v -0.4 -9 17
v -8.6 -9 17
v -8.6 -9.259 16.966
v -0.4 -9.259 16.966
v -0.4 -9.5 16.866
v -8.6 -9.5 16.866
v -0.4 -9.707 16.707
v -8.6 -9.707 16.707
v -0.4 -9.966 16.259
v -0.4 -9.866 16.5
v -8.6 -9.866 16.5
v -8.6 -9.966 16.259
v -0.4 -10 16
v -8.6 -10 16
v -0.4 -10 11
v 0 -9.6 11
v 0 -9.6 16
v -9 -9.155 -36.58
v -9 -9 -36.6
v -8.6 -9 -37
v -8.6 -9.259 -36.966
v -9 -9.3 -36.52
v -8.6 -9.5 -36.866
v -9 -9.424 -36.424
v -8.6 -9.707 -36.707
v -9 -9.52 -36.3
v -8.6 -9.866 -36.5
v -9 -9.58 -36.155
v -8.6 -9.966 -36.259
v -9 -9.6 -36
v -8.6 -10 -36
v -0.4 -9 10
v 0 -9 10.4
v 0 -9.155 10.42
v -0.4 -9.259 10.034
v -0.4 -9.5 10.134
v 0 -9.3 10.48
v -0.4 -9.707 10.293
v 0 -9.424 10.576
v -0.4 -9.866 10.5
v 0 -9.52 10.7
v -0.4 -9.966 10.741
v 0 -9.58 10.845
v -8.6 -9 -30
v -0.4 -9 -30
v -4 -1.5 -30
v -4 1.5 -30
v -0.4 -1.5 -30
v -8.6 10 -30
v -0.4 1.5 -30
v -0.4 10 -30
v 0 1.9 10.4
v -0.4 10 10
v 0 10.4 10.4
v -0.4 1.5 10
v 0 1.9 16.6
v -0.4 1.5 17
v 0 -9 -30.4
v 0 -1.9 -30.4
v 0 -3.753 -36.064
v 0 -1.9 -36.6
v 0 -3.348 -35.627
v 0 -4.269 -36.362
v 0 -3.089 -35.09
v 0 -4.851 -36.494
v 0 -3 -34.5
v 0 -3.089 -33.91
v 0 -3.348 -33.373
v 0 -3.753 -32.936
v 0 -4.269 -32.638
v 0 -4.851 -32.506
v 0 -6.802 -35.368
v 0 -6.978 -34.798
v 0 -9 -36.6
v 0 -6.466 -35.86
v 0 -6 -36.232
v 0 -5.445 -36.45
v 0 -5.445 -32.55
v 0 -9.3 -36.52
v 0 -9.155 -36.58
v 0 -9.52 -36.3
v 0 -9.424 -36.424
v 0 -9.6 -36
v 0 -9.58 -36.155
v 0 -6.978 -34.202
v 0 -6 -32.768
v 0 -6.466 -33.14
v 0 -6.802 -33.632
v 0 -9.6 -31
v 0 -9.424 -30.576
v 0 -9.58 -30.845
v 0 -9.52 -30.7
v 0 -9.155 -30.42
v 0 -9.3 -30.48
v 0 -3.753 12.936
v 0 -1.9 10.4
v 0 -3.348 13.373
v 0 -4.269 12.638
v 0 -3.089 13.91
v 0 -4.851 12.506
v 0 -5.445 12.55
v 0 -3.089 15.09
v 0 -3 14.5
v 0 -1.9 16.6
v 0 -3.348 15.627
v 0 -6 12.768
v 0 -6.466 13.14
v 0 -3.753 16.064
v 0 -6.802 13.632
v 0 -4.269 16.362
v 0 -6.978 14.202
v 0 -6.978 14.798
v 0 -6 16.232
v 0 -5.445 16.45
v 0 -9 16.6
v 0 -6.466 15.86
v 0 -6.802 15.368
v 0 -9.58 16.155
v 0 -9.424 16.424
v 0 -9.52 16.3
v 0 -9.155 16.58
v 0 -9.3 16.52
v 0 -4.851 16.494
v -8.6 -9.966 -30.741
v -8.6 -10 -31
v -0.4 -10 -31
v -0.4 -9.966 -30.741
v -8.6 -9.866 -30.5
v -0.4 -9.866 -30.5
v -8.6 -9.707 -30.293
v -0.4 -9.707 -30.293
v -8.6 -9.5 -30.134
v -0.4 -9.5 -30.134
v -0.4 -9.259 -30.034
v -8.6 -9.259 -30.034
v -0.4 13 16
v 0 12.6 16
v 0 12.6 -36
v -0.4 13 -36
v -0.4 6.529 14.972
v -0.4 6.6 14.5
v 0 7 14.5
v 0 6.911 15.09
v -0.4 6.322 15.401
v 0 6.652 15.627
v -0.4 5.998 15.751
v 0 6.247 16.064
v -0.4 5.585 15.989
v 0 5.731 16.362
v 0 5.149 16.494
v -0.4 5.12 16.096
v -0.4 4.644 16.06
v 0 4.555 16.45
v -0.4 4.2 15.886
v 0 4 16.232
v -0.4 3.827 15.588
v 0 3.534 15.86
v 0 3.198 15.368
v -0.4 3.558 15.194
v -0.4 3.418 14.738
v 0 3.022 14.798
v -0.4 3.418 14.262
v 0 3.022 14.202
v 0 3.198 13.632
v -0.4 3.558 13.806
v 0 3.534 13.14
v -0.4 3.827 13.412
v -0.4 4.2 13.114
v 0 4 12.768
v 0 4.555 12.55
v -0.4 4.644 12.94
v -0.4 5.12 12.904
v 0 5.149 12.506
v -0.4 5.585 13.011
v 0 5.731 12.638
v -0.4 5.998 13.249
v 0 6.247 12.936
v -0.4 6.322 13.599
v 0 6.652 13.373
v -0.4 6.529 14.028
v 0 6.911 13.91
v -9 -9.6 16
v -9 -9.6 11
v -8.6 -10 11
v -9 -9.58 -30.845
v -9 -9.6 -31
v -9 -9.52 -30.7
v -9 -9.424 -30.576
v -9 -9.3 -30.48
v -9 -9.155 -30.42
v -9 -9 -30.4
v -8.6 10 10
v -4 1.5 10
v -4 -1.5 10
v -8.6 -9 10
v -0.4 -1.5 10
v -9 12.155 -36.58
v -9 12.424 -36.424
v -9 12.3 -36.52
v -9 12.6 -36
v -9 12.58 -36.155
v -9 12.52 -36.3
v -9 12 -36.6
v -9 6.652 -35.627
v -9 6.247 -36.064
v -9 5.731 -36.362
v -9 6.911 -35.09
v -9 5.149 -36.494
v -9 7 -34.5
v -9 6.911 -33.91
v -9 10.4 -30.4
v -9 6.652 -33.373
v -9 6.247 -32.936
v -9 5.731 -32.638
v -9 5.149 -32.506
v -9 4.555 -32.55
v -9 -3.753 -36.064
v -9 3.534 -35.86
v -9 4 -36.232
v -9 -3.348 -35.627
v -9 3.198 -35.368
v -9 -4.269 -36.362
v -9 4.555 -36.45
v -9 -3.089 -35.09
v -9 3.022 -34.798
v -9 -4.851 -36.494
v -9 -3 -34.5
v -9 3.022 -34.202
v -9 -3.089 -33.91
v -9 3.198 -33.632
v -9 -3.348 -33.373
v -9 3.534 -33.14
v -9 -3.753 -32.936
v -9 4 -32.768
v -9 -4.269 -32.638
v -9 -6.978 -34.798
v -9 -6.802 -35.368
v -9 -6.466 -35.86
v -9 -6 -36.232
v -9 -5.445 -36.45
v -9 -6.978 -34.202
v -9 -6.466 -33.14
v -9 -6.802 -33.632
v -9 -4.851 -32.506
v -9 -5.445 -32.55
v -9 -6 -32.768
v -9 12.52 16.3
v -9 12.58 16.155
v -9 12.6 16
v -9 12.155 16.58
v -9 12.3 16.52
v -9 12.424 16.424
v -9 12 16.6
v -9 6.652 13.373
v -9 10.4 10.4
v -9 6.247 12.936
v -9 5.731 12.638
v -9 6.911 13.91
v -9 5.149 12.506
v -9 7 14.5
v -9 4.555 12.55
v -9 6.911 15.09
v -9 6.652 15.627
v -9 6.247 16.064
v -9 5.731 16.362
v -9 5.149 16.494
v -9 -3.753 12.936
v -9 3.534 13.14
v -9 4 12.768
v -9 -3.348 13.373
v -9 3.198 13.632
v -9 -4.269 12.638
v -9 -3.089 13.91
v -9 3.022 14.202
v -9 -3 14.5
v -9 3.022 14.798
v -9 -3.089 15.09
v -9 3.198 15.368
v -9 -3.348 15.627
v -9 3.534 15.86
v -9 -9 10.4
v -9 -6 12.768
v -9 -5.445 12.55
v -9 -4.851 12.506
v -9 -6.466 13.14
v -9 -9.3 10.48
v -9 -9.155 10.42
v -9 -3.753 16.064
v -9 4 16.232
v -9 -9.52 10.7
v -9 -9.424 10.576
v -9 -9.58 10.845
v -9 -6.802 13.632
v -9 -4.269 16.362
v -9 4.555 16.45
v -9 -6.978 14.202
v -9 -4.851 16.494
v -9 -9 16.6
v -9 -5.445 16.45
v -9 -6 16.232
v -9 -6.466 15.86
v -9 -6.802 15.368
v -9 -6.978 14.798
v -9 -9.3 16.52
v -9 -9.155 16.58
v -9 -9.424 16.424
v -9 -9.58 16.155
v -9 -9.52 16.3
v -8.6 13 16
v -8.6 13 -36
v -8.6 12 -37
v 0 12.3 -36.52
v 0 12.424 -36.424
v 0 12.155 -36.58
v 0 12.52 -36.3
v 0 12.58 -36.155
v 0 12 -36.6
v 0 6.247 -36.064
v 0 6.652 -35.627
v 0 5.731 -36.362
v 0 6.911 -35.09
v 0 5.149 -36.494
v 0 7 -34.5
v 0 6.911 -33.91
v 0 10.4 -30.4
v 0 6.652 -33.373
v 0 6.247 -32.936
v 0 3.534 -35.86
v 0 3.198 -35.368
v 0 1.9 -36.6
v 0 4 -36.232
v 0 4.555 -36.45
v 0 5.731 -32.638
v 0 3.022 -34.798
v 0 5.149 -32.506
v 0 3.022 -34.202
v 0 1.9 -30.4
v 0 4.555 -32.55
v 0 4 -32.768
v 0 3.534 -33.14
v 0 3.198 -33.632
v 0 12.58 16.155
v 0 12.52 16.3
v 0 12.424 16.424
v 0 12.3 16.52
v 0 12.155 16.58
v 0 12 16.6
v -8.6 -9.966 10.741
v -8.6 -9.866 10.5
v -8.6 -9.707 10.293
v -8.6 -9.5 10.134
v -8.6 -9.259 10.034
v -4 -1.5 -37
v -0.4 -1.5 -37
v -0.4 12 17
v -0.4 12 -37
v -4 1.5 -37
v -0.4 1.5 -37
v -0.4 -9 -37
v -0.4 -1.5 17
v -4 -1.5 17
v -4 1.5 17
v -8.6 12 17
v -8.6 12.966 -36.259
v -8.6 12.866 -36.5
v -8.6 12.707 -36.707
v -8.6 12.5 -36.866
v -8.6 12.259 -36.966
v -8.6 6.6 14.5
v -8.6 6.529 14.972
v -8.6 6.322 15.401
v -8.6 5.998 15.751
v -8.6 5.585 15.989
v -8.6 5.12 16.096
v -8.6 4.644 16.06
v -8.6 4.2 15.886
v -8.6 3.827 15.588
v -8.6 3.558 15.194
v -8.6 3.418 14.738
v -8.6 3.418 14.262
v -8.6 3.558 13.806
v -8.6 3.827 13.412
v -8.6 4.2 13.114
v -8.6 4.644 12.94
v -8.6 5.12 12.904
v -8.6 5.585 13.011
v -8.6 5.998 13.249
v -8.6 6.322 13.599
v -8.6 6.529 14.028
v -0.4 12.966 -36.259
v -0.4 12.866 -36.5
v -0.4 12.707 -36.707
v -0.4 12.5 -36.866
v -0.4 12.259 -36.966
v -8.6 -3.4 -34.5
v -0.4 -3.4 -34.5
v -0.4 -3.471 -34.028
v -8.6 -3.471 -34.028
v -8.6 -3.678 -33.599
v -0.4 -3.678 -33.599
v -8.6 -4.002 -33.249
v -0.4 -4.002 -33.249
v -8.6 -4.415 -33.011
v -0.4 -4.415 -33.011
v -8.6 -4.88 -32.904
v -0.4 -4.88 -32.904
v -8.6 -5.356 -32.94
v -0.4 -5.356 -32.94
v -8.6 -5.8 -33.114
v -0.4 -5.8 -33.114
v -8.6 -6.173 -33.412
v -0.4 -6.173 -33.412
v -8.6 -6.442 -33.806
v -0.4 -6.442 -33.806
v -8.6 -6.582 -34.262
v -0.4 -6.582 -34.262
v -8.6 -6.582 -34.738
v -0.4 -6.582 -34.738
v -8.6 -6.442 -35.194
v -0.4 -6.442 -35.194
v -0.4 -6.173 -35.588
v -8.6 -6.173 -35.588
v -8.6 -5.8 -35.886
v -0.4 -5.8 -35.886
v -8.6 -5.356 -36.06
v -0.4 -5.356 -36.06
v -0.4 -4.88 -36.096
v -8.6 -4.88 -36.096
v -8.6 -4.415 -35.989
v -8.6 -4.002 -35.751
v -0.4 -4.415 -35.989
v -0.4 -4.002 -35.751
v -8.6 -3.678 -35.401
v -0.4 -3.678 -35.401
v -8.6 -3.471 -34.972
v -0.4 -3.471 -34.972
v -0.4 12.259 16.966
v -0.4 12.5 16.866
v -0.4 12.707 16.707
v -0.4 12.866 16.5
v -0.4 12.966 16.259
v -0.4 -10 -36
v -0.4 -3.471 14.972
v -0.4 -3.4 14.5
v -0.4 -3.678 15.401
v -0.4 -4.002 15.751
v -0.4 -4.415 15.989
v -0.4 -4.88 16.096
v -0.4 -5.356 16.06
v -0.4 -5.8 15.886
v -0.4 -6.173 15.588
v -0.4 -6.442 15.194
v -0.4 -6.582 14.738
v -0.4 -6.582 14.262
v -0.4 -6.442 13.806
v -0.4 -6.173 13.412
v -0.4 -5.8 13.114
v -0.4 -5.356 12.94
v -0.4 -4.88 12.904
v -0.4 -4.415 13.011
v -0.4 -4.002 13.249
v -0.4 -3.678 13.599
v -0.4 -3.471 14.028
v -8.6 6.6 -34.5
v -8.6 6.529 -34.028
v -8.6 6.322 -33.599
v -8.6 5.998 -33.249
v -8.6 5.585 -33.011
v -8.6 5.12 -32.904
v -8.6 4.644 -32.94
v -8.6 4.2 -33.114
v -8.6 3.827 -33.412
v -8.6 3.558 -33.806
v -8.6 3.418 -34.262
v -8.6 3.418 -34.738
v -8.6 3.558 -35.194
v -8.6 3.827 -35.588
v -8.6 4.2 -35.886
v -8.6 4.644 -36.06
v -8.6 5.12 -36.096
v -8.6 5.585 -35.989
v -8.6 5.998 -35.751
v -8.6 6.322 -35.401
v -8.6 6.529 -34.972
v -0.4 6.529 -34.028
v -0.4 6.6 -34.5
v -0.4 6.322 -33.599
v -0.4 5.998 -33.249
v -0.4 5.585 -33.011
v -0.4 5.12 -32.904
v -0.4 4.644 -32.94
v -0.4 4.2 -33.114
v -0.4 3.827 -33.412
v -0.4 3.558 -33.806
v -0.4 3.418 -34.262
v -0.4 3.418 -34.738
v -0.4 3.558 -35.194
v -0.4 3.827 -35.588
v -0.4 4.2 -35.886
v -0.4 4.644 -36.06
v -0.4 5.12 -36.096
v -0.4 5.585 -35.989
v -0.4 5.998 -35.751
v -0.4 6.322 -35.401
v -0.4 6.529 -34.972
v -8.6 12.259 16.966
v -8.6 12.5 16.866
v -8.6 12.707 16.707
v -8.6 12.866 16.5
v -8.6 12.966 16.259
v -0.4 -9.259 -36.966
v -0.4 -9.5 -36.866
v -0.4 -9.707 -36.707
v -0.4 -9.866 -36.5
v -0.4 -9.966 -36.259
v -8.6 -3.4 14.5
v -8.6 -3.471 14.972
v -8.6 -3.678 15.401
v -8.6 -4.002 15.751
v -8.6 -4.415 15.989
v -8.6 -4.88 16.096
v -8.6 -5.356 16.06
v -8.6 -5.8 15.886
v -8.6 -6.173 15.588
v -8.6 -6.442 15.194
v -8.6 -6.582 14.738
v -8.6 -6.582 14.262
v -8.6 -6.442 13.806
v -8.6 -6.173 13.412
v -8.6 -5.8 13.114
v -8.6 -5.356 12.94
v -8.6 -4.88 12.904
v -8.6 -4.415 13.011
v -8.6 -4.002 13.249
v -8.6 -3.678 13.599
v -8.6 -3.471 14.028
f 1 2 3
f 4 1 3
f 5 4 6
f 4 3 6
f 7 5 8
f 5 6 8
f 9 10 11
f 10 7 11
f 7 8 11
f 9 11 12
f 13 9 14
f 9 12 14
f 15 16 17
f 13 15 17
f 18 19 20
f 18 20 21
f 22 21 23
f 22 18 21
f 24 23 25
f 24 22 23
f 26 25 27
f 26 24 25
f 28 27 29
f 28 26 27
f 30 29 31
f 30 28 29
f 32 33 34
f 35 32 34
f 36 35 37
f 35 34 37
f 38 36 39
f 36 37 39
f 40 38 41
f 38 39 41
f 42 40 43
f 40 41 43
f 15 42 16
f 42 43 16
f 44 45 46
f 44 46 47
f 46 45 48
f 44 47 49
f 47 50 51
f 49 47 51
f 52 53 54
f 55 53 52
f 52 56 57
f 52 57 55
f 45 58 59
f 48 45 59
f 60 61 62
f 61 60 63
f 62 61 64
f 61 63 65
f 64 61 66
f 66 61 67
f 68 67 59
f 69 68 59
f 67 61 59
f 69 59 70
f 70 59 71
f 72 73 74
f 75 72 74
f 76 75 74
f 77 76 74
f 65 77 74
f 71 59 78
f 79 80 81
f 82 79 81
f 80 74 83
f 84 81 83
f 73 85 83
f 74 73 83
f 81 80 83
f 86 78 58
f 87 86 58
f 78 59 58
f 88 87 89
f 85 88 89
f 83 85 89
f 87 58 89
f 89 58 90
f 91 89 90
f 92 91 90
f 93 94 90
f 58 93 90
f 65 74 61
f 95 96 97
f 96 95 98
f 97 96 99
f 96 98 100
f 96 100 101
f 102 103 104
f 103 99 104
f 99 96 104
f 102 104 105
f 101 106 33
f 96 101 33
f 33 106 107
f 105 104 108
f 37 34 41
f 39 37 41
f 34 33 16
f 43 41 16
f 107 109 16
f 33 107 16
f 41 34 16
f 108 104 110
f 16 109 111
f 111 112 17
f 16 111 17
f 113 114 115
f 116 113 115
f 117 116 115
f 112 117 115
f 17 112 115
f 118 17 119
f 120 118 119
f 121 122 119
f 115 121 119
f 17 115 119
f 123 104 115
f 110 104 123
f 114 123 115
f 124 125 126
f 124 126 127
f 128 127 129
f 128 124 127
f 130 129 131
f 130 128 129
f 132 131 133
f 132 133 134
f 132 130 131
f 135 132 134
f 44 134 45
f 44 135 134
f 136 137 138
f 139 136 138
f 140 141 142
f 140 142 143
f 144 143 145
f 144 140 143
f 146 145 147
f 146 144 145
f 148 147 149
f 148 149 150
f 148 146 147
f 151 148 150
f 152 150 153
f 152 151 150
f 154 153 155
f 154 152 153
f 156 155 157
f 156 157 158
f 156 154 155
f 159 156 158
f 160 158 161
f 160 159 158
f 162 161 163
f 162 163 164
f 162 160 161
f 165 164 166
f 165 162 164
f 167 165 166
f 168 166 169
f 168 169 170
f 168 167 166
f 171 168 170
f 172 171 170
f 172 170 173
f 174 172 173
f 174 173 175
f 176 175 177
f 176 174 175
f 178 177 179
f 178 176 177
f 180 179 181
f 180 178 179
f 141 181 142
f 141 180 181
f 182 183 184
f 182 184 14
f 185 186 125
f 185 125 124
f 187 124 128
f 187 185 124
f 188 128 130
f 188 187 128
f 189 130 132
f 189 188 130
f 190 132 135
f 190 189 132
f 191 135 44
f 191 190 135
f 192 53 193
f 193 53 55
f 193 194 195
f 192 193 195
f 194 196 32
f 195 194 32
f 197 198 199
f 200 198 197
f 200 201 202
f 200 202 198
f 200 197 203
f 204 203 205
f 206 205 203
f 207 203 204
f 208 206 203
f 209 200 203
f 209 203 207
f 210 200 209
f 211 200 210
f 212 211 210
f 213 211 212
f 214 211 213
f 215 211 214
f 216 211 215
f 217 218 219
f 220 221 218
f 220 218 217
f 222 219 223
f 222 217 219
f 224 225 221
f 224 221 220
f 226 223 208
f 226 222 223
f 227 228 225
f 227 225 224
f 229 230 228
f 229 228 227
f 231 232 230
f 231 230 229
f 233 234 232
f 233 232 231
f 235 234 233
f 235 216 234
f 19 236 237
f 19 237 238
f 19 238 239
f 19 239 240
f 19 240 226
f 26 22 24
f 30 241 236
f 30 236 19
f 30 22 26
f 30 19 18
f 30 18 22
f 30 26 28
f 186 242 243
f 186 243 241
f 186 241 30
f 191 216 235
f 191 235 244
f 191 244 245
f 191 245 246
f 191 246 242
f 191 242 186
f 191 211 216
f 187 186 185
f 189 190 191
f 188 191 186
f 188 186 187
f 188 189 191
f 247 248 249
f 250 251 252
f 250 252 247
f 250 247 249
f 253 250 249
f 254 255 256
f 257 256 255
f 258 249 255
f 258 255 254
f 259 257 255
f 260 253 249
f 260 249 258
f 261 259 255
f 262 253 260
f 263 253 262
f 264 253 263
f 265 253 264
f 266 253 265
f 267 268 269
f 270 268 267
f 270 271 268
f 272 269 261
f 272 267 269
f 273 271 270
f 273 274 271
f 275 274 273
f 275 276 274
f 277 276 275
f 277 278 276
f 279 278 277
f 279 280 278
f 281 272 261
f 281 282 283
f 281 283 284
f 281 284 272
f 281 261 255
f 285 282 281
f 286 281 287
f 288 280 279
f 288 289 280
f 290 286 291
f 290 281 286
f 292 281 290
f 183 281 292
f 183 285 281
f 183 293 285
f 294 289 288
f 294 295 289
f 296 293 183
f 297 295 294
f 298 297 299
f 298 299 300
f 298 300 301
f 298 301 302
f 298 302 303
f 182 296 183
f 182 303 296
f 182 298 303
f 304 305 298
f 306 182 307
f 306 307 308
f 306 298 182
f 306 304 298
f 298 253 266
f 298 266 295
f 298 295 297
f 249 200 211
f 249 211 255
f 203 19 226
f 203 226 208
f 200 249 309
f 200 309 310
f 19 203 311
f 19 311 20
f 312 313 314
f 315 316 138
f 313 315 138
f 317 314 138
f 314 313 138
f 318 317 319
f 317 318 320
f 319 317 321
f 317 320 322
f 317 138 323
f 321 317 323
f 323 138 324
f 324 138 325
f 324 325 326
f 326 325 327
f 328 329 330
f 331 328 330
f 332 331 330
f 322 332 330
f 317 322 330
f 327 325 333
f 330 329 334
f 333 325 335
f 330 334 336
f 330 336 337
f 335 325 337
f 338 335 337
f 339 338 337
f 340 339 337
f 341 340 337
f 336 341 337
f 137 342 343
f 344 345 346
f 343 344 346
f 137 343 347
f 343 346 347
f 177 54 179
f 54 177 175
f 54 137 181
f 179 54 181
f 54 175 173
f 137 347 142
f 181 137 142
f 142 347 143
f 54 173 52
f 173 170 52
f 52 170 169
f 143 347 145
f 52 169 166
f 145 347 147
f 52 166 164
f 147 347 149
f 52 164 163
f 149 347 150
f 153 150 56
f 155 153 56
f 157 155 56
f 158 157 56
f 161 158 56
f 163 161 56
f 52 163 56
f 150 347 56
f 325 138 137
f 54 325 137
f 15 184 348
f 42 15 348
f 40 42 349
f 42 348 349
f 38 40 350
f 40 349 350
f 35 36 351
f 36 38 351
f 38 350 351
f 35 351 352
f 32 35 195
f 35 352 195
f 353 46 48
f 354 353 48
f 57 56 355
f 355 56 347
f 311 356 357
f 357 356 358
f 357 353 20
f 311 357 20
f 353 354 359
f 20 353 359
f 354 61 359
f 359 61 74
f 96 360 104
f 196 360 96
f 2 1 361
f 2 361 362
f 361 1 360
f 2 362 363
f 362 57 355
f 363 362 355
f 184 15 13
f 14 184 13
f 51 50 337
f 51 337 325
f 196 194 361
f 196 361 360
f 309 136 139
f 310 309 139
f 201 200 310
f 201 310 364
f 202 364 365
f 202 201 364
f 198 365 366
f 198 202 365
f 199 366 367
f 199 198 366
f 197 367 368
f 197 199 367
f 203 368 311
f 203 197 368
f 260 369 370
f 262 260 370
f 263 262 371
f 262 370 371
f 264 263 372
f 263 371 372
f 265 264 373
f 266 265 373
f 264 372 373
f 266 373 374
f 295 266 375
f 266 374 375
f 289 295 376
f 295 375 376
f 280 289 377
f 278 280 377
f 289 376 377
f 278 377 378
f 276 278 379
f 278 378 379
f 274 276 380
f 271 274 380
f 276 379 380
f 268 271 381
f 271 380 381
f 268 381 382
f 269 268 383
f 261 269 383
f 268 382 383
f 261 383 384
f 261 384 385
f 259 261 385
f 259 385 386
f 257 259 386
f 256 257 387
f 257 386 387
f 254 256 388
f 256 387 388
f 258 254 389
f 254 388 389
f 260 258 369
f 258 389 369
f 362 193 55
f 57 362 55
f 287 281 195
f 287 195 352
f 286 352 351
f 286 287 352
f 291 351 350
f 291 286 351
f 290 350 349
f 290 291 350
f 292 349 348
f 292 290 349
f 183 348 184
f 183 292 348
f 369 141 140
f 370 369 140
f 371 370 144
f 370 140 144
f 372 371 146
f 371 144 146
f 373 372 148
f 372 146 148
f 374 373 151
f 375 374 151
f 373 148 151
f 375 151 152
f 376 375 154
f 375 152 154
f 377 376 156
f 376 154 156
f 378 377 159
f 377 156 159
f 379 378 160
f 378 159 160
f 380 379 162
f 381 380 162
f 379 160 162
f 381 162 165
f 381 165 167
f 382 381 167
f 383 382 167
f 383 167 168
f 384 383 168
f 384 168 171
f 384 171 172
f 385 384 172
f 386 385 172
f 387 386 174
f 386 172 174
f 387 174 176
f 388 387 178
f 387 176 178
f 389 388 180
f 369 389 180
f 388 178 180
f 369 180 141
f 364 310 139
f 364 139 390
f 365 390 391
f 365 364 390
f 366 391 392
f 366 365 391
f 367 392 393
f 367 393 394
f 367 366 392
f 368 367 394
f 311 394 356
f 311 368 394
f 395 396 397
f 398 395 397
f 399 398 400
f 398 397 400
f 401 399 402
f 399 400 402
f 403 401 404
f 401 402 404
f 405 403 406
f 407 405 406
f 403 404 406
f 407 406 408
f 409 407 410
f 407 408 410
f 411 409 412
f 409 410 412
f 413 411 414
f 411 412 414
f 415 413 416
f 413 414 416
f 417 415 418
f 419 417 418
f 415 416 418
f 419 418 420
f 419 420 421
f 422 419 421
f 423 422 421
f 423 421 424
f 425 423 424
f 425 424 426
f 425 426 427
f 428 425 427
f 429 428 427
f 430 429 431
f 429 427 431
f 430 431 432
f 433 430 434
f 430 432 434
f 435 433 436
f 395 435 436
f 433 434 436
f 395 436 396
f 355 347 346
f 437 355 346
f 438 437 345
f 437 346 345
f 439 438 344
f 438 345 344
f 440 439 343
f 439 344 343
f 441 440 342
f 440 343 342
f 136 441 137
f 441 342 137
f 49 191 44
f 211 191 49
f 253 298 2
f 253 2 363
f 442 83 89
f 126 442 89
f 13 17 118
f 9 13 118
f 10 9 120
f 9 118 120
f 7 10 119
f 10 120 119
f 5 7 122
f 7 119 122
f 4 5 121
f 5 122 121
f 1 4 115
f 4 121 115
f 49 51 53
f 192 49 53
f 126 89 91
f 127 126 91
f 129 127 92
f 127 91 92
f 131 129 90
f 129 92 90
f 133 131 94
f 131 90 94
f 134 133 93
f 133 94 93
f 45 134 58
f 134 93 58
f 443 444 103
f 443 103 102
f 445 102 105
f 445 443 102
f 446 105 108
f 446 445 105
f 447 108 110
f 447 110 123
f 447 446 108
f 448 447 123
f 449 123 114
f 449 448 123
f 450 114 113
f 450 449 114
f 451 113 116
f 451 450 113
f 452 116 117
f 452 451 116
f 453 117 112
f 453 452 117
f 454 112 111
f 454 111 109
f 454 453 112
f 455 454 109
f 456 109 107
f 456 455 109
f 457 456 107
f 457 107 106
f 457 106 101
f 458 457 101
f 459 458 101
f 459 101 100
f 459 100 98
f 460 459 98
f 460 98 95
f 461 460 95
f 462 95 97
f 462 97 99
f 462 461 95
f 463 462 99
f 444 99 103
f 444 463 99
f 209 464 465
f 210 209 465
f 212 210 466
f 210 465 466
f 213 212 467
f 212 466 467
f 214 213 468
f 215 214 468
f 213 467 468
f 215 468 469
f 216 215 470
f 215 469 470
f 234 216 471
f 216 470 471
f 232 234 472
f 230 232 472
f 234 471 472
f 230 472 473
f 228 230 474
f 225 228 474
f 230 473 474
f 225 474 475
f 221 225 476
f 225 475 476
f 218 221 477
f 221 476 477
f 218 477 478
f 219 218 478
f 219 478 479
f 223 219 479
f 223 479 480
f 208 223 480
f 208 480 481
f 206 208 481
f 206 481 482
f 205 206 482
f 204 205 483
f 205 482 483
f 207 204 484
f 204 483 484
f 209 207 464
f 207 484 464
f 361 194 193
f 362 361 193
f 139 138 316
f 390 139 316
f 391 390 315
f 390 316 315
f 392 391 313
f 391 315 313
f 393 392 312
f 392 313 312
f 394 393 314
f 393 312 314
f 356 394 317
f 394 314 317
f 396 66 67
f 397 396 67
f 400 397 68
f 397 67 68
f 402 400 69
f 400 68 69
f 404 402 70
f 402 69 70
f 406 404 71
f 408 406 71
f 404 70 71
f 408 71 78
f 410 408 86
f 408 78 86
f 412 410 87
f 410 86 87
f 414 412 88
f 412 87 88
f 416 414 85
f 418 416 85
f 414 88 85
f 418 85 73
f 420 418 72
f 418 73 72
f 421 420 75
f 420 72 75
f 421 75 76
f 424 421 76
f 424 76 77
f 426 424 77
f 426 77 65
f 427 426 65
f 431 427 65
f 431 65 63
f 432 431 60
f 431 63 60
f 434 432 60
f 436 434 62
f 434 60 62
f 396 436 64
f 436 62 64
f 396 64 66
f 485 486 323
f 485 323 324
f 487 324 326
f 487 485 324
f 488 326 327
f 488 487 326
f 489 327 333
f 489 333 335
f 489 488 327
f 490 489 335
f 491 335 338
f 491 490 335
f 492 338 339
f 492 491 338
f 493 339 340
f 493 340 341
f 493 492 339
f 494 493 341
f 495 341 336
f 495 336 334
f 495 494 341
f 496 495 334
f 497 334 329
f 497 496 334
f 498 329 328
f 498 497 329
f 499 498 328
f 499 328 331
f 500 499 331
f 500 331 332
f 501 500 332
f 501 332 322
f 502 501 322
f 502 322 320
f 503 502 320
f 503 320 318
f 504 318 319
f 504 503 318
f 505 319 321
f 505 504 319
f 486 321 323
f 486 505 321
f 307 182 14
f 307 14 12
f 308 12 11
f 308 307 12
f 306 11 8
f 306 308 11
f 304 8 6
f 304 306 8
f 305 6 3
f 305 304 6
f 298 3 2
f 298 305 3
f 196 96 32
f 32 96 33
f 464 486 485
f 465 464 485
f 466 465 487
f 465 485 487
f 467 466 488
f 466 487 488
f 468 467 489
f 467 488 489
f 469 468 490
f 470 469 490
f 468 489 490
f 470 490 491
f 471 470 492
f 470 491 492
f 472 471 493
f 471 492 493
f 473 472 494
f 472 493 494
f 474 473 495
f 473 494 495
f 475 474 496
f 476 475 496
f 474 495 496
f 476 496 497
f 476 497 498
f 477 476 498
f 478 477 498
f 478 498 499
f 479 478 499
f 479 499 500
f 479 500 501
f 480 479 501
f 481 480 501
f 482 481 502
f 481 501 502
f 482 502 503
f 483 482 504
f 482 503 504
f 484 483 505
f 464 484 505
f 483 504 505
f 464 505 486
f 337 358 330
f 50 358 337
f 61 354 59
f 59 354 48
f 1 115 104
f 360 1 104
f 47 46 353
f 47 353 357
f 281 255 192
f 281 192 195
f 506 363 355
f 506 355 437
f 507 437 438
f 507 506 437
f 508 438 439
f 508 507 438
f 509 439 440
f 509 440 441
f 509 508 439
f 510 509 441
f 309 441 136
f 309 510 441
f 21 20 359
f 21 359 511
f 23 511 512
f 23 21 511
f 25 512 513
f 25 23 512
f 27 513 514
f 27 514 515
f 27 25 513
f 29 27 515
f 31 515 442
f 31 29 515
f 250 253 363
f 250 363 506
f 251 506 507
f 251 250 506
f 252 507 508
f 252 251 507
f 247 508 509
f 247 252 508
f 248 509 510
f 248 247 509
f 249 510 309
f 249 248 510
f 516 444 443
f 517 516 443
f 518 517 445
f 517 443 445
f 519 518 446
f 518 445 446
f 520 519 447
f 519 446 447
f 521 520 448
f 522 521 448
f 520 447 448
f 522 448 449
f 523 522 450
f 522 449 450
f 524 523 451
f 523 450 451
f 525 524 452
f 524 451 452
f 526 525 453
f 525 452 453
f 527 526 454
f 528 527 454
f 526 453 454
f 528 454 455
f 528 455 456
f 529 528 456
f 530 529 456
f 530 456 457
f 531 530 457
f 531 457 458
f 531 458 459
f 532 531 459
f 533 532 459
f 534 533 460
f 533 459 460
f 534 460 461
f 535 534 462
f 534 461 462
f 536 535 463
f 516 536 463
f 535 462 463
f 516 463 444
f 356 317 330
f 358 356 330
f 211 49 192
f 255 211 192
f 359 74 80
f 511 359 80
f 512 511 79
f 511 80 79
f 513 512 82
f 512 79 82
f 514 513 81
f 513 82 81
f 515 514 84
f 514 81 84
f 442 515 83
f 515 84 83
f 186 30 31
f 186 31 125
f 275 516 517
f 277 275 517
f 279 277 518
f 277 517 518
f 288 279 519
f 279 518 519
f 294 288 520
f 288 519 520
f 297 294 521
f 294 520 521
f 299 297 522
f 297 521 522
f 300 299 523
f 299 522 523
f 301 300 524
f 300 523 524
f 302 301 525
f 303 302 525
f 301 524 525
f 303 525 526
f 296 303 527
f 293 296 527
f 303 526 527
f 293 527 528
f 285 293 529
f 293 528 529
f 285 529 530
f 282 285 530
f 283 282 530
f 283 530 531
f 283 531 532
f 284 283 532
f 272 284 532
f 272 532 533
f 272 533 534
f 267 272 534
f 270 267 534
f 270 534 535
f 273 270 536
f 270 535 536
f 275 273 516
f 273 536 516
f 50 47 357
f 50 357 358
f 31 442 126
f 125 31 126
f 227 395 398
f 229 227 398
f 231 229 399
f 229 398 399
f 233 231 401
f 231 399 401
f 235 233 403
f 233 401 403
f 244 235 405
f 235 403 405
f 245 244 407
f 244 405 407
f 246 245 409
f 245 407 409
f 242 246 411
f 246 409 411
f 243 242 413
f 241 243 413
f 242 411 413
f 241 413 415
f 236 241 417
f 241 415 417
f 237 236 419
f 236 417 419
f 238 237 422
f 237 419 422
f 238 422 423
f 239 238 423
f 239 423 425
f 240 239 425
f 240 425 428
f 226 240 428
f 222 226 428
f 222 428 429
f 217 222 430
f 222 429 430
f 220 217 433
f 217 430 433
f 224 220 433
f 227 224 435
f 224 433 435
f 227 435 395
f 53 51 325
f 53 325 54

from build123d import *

# Parameters (mm, degrees)
SKETCH044_R       = 1.6
PAD025_DEPTH      = 9
FILLET013_R       = 1
SKETCH075_W       = 8
SKETCH075_H       = 3
POCKET_DEPTH      = 37.001
POCKET_DEPTH_BACK = -17.001
CHAMFER_SIZE      = 0.4


with BuildPart() as part:
    # Sketch044 → Pad025 (new body)
    with BuildSketch(Plane.YZ):
        Polygon((-10, 17), (13, 17), (13, -37), (-10, -37), (-10, -30), (10, -30), (10, 10), (-10, 10), align=None)
        with Locations((-5, 14.5)):
            Circle(SKETCH044_R, mode=Mode.SUBTRACT)
        with Locations((5, 14.5)):
            Circle(SKETCH044_R, mode=Mode.SUBTRACT)
        with Locations((-5, -34.5)):
            Circle(SKETCH044_R, mode=Mode.SUBTRACT)
        with Locations((5, -34.5)):
            Circle(SKETCH044_R, mode=Mode.SUBTRACT)
    extrude(amount=-PAD025_DEPTH)

    # Fillet013
    fillet013_edges = [part.edges().sort_by_distance(p)[0] for p in [
        (-4.5, -10, 17),
        (-4.5, -10, 10),
        (-4.5, -10, -30),
        (-4.5, -10, -37),
        (-4.5, 13, -37),
        (-4.5, 13, 17),
    ]]
    fillet(fillet013_edges, radius=FILLET013_R)

    # Sketch075 (on XY_Plane042 of Origin045) → Pocket (cut, two sides)
    with BuildSketch(Plane.XY) as pocket_sk:
        Rectangle(SKETCH075_W, SKETCH075_H)
    extrude(amount=-POCKET_DEPTH, mode=Mode.SUBTRACT)
    extrude(pocket_sk.sketch, amount=-POCKET_DEPTH_BACK, mode=Mode.SUBTRACT)

    # Chamfer
    chamfer_edges = [part.edges().sort_by_distance(p)[0] for p in [
        (0, 6.75, 17),
        (0, 12.707107, 16.707107),
        (0, 13, -10),
        (0, 12.707107, -36.707107),
        (0, 6.75, -37),
        (0, 1.5, -33.5),
        (0, 5.75, -30),
        (0, 10, -10),
        (0, 5.75, 10),
        (0, 1.5, 13.5),
        (0, 3.4, -34.5),
        (0, 3.4, 14.5),
        (0, -5.25, 17),
        (0, -1.5, 13.5),
        (0, -5.25, 10),
        (0, -9.707107, 10.292893),
        (0, -10, 13.5),
        (0, -9.707107, 16.707107),
        (0, -6.6, 14.5),
        (0, -1.5, -33.5),
        (0, -5.25, -37),
        (0, -9.707107, -36.707107),
        (0, -10, -33.5),
        (0, -9.707107, -30.292893),
        (0, -5.25, -30),
        (0, -6.6, -34.5),
        (-9, 1.5, 17),
        (-9, -9.707107, 16.707107),
        (-9, 12.707107, 16.707107),
        (-9, -10, 13.5),
        (-9, 13, -10),
        (-9, -9.707107, 10.292893),
        (-9, 12.707107, -36.707107),
        (-9, 0.5, 10),
        (-9, 1.5, -37),
        (-9, 10, -10),
        (-9, -9.707107, -36.707107),
        (-9, 0.5, -30),
        (-9, -10, -33.5),
        (-9, -9.707107, -30.292893),
        (-9, -6.6, 14.5),
        (-9, 3.4, 14.5),
        (-9, -6.6, -34.5),
        (-9, 3.4, -34.5),
    ]]
    chamfer(chamfer_edges, length=CHAMFER_SIZE)


solid = part.part
